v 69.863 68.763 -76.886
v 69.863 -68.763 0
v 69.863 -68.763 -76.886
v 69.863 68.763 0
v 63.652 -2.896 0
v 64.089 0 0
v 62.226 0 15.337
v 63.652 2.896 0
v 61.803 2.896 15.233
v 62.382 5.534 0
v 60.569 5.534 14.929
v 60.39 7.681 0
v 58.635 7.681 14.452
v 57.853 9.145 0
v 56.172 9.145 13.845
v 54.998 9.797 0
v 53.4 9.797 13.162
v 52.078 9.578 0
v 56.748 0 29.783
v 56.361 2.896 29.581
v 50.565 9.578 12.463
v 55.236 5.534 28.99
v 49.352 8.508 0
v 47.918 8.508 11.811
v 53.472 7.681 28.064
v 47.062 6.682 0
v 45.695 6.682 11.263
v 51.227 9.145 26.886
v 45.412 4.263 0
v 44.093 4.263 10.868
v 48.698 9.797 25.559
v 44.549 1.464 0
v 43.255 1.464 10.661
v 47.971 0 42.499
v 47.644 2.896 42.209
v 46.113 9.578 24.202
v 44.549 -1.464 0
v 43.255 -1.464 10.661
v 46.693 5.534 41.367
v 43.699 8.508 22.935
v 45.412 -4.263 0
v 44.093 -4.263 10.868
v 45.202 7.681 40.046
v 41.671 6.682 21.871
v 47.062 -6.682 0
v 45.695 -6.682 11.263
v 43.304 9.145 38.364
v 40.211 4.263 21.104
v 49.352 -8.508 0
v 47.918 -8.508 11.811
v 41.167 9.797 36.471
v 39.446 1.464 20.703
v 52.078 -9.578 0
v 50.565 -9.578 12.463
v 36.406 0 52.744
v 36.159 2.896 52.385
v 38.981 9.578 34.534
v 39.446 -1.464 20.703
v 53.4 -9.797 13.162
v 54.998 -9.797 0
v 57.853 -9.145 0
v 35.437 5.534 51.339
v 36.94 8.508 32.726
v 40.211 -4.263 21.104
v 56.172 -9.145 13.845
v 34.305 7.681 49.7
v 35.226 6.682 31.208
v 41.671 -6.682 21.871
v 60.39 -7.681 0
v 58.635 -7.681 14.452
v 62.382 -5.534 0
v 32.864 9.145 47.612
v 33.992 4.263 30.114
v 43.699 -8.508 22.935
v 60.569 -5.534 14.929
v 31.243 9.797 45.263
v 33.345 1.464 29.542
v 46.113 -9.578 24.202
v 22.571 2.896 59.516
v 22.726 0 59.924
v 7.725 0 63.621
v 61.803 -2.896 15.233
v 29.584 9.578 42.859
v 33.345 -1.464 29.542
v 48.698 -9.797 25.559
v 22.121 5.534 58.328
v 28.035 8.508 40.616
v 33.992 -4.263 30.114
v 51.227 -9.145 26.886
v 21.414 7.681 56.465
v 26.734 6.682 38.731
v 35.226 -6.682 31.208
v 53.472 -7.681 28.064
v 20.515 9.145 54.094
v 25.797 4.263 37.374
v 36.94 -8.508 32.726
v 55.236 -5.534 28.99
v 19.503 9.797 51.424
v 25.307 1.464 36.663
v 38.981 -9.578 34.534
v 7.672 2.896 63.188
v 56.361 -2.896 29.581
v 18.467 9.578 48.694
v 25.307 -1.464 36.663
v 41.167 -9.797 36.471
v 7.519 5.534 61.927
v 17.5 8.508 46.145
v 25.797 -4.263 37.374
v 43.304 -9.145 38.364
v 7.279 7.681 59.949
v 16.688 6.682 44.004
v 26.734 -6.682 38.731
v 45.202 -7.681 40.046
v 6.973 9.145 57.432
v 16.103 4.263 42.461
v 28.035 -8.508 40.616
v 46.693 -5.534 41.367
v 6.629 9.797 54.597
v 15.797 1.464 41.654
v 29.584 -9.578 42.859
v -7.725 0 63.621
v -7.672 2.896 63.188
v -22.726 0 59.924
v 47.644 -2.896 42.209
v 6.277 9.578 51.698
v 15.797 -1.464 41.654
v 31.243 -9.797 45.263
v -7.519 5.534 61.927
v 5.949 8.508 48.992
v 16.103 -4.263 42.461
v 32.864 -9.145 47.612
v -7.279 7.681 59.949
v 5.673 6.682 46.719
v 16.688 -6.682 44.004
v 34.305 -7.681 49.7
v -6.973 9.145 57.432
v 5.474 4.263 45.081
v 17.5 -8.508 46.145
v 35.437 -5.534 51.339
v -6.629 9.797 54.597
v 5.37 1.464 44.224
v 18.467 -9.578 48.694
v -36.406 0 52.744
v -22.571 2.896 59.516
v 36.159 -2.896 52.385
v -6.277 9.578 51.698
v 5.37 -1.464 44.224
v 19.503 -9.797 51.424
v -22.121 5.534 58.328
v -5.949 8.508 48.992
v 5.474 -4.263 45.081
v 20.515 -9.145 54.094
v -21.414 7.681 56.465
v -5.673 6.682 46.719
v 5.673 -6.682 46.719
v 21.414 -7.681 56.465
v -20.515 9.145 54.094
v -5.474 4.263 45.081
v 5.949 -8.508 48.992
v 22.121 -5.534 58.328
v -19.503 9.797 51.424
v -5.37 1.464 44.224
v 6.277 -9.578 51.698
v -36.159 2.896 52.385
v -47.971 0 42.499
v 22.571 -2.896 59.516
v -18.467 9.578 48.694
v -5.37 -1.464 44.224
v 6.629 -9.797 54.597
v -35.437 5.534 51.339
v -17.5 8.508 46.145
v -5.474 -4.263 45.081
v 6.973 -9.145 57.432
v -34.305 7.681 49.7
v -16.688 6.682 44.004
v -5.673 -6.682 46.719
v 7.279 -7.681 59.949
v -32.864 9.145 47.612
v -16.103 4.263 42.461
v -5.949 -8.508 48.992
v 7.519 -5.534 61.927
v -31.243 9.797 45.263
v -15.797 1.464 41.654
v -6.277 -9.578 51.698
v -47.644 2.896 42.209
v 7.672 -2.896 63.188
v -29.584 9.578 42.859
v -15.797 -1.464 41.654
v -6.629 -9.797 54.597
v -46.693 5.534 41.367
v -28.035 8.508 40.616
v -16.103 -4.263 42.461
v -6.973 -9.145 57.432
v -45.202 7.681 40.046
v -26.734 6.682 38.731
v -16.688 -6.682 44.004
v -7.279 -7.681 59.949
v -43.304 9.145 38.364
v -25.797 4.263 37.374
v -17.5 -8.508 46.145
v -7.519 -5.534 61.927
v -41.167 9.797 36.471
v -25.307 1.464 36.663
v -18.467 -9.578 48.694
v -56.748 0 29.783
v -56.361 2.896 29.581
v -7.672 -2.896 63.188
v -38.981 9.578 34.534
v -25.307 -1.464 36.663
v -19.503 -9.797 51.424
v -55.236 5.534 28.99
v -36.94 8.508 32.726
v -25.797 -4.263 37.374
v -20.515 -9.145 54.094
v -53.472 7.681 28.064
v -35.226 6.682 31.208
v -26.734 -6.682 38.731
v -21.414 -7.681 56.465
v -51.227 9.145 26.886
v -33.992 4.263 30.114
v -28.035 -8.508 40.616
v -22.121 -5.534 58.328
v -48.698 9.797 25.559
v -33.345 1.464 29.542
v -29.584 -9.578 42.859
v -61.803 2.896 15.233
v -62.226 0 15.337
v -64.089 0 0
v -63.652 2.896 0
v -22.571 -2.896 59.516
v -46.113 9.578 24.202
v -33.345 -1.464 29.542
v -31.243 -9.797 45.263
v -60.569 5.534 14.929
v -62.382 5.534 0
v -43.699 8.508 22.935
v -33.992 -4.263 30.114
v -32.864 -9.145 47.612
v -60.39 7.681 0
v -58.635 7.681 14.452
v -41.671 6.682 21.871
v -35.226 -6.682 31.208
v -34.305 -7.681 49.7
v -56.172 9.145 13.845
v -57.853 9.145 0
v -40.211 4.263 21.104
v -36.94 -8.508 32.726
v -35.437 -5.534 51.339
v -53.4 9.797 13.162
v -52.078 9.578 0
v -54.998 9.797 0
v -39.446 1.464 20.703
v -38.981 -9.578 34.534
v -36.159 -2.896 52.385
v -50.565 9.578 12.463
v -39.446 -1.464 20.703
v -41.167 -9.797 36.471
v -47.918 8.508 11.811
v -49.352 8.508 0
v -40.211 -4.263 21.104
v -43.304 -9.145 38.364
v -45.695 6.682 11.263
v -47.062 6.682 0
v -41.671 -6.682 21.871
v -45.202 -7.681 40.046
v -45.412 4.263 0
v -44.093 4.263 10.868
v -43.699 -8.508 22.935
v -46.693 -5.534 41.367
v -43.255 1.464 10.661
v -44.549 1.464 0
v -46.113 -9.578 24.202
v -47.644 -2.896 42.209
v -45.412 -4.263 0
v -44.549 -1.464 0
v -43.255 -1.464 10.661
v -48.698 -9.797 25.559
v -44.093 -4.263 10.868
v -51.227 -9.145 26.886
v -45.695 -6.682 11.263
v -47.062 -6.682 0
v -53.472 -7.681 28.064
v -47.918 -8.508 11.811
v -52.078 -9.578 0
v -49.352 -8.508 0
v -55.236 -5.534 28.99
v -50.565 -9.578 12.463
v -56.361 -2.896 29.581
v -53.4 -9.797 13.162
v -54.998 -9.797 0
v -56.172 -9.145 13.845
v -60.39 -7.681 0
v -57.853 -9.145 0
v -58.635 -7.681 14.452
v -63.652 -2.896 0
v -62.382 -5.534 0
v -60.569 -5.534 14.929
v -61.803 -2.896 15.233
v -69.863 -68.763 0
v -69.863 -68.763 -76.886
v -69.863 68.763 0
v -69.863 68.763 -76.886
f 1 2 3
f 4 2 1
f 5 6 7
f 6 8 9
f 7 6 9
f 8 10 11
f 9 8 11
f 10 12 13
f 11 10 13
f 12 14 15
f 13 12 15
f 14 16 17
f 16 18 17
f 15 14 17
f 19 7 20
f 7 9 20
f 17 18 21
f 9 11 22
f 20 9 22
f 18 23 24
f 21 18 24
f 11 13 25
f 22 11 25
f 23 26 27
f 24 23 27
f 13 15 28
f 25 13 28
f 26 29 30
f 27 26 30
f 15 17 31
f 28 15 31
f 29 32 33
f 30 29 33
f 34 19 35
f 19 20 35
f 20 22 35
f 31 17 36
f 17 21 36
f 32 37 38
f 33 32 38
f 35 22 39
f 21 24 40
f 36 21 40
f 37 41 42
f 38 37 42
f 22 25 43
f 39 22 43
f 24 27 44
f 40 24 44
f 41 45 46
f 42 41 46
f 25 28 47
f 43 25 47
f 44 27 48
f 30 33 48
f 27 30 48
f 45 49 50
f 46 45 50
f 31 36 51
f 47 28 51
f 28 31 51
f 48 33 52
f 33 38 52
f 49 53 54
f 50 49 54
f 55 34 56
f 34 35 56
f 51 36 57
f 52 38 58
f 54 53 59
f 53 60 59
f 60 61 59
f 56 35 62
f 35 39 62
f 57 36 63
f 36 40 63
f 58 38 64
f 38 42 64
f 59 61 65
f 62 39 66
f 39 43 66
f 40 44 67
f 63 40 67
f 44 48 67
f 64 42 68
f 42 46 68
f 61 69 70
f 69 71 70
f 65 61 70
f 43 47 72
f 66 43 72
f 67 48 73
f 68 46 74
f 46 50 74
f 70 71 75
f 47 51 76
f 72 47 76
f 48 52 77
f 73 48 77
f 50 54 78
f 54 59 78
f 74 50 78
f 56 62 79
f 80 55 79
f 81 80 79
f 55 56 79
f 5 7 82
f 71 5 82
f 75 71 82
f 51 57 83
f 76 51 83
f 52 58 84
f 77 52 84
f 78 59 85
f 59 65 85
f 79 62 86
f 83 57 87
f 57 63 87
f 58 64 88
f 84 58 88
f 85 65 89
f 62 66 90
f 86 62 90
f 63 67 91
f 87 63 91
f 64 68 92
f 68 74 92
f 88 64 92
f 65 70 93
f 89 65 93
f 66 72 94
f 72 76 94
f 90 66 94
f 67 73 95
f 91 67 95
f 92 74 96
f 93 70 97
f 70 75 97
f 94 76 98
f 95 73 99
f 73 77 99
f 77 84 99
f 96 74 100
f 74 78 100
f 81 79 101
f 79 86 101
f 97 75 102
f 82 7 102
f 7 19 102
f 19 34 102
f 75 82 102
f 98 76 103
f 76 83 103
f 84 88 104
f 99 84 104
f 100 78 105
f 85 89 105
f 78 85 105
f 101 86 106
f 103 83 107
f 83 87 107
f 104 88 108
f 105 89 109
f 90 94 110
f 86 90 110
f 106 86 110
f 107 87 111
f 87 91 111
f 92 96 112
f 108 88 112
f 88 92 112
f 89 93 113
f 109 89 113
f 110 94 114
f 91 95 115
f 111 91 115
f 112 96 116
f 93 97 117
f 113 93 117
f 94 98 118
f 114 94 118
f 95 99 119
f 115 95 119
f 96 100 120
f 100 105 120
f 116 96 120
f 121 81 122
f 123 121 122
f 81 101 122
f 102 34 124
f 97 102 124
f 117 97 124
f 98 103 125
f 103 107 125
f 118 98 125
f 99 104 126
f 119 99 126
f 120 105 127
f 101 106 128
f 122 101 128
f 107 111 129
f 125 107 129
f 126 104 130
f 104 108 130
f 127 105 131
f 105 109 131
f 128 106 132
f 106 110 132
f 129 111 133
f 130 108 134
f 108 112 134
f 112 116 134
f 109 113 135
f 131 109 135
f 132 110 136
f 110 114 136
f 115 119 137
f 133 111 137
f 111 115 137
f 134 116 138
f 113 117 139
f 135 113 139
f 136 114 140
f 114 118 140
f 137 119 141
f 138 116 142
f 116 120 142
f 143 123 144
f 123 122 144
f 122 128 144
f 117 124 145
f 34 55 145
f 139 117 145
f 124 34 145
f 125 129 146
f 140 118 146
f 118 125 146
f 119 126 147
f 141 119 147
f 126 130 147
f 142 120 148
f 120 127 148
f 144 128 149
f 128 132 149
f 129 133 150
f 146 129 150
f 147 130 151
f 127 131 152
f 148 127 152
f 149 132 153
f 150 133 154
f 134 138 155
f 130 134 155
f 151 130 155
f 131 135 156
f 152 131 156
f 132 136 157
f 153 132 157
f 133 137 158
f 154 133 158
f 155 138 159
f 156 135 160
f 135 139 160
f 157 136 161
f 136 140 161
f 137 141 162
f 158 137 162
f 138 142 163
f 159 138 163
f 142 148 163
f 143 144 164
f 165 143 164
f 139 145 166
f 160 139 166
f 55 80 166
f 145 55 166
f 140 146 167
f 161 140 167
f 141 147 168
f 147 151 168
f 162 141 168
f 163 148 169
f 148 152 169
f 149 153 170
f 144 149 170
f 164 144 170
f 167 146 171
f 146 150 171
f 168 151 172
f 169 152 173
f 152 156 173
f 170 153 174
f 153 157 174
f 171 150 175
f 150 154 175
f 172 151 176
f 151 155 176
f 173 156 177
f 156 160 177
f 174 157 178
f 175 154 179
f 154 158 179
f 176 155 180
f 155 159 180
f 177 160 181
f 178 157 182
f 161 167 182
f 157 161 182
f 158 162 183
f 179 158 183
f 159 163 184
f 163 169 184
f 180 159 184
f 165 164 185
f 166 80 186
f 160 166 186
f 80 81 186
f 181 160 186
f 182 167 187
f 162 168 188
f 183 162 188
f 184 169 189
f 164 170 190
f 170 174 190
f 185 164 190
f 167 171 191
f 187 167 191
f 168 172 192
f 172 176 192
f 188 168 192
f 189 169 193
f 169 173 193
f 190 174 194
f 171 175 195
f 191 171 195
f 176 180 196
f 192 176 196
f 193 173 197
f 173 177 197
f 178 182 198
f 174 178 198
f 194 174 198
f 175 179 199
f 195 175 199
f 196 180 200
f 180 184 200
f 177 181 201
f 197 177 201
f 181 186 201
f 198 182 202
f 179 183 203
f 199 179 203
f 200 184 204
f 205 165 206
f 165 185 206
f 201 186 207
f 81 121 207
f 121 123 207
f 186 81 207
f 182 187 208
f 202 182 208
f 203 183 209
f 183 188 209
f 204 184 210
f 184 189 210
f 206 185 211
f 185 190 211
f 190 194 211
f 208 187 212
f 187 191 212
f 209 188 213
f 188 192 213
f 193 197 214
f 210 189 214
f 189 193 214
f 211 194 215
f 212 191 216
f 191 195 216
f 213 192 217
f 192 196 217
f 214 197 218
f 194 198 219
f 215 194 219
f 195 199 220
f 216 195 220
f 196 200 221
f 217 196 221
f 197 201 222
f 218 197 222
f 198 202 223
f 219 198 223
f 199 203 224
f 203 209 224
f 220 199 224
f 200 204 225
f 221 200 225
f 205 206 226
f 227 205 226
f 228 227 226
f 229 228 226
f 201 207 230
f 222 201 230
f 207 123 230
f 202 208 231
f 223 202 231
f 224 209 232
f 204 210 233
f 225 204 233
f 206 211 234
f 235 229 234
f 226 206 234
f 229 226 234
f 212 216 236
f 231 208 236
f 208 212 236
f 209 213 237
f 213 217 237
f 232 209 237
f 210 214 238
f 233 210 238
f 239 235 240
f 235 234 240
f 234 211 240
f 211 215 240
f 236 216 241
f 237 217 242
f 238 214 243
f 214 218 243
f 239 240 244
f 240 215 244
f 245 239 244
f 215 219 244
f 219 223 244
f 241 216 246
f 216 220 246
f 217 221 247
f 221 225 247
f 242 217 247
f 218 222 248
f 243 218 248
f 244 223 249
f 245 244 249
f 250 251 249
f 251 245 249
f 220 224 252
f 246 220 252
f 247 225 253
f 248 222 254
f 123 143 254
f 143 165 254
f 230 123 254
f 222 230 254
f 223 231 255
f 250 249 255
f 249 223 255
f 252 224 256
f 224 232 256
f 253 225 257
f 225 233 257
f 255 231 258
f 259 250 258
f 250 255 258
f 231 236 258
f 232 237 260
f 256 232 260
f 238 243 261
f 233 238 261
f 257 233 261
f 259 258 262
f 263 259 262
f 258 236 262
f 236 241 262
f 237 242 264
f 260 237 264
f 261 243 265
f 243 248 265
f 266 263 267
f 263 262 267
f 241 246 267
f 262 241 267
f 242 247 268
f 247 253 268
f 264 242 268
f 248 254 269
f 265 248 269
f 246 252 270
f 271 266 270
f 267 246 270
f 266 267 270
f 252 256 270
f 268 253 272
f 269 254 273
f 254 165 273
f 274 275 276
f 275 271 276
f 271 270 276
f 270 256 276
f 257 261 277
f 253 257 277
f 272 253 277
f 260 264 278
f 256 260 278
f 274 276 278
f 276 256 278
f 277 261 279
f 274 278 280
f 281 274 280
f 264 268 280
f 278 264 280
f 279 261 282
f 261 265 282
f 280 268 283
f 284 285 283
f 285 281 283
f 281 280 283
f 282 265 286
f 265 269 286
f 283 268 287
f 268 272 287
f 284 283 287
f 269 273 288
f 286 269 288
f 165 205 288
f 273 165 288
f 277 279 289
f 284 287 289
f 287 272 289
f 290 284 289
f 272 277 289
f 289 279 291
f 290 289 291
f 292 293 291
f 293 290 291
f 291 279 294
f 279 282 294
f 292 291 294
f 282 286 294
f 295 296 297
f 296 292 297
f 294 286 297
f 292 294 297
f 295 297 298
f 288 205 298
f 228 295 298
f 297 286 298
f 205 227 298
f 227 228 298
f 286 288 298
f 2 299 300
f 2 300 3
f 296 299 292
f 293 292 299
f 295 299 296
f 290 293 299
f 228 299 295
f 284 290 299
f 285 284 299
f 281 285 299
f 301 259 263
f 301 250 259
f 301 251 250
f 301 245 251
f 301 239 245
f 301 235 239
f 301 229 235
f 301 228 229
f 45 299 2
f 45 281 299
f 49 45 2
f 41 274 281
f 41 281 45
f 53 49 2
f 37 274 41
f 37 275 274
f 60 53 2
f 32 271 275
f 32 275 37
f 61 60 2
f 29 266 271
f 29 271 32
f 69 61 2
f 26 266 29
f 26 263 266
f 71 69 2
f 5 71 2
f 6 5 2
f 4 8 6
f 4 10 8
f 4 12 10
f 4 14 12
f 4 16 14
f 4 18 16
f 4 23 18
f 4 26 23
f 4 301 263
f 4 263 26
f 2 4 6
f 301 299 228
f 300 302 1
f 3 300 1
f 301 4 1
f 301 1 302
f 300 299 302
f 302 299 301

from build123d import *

# Parameters (mm, degrees)
F1_R     = 9.824635
F0_W     = 69.863096
F0_H     = 137.526572
F3_DEPTH = 76.8858


with BuildPart() as f2:
    # F1 (on Top) → F2 (revolve)
    with BuildSketch(Plane.XY):
        with Locations((54.264009, 0)):
            Circle(F1_R)
    revolve(axis=Axis((0, 0, 0), (0, -1, 0)))

    # F0 (on Top) → F3 (join)
    with BuildSketch(Plane.XY):
        with Locations((34.931548, 0)):
            Rectangle(F0_W, F0_H)
        with Locations((-34.931548, 0)):
            Rectangle(F0_W, F0_H)
    extrude(amount=-F3_DEPTH)


solid = f2.part
